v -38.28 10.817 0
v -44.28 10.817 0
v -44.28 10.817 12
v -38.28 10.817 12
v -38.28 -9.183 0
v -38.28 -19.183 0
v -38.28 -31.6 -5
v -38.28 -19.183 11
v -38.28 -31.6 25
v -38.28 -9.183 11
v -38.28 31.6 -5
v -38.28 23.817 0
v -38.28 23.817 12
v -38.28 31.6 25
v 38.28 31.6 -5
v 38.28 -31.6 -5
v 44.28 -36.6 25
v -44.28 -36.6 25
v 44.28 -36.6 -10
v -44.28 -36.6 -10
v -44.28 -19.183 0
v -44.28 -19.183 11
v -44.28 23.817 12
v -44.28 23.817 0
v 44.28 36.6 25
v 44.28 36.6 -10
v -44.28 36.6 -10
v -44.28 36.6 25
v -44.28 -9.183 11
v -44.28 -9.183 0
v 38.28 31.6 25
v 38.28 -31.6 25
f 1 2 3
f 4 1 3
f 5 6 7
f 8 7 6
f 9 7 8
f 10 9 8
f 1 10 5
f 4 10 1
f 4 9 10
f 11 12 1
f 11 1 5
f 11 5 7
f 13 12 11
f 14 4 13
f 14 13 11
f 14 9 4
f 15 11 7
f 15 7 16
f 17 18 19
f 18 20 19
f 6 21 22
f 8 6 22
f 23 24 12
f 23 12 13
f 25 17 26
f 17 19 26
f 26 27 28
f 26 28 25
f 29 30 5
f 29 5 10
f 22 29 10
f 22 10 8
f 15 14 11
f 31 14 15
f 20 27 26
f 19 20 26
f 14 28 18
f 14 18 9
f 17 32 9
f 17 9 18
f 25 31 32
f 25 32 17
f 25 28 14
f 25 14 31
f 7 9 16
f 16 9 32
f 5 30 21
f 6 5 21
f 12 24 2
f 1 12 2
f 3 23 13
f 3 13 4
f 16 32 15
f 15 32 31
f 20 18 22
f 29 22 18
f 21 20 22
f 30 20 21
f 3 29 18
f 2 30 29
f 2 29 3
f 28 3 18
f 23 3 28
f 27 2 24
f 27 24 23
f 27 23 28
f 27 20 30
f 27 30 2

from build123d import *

# Parameters (mm, degrees)
F0_W      = 88.56
F0_H      = 73.2
F1_DEPTH  = 10
F1_FACE_W = 88.56
F1_FACE_H = 73.2
F2_DEPTH  = 25
F3_W      = 76.56
F3_H      = 63.2
F4_DEPTH  = 30
F6_W      = 13
F6_H      = 12
F6_W_2    = 10
F6_H_2    = 11
F7_DEPTH  = 25


with BuildPart() as f1:
    # F0 (on Top) → F1 (new body)
    with BuildSketch(Plane.XY):
        Rectangle(F0_W, F0_H)
    extrude(amount=-F1_DEPTH)

    # F1_face (on face) → F2 (join)
    with BuildSketch(Plane.XY):
        Rectangle(F1_FACE_W, F1_FACE_H)
    extrude(amount=F2_DEPTH)

    # F3 (on face) → F4 (cut)
    with BuildSketch(Plane.XY.offset(25)):
        Rectangle(F3_W, F3_H)
    extrude(amount=-F4_DEPTH, mode=Mode.SUBTRACT)

    # F6 (on face) → F7 (cut)
    with BuildSketch(Plane(origin=(-44.28, 0, 0), x_dir=(0, -1, 0), z_dir=(-1, 0, 0))):
        with Locations((-17.316721, 6)):
            Rectangle(F6_W, F6_H)
        with Locations((14.183279, 5.5)):
            Rectangle(F6_W_2, F6_H_2)
    extrude(amount=-F7_DEPTH, mode=Mode.SUBTRACT)


solid = f1.part
